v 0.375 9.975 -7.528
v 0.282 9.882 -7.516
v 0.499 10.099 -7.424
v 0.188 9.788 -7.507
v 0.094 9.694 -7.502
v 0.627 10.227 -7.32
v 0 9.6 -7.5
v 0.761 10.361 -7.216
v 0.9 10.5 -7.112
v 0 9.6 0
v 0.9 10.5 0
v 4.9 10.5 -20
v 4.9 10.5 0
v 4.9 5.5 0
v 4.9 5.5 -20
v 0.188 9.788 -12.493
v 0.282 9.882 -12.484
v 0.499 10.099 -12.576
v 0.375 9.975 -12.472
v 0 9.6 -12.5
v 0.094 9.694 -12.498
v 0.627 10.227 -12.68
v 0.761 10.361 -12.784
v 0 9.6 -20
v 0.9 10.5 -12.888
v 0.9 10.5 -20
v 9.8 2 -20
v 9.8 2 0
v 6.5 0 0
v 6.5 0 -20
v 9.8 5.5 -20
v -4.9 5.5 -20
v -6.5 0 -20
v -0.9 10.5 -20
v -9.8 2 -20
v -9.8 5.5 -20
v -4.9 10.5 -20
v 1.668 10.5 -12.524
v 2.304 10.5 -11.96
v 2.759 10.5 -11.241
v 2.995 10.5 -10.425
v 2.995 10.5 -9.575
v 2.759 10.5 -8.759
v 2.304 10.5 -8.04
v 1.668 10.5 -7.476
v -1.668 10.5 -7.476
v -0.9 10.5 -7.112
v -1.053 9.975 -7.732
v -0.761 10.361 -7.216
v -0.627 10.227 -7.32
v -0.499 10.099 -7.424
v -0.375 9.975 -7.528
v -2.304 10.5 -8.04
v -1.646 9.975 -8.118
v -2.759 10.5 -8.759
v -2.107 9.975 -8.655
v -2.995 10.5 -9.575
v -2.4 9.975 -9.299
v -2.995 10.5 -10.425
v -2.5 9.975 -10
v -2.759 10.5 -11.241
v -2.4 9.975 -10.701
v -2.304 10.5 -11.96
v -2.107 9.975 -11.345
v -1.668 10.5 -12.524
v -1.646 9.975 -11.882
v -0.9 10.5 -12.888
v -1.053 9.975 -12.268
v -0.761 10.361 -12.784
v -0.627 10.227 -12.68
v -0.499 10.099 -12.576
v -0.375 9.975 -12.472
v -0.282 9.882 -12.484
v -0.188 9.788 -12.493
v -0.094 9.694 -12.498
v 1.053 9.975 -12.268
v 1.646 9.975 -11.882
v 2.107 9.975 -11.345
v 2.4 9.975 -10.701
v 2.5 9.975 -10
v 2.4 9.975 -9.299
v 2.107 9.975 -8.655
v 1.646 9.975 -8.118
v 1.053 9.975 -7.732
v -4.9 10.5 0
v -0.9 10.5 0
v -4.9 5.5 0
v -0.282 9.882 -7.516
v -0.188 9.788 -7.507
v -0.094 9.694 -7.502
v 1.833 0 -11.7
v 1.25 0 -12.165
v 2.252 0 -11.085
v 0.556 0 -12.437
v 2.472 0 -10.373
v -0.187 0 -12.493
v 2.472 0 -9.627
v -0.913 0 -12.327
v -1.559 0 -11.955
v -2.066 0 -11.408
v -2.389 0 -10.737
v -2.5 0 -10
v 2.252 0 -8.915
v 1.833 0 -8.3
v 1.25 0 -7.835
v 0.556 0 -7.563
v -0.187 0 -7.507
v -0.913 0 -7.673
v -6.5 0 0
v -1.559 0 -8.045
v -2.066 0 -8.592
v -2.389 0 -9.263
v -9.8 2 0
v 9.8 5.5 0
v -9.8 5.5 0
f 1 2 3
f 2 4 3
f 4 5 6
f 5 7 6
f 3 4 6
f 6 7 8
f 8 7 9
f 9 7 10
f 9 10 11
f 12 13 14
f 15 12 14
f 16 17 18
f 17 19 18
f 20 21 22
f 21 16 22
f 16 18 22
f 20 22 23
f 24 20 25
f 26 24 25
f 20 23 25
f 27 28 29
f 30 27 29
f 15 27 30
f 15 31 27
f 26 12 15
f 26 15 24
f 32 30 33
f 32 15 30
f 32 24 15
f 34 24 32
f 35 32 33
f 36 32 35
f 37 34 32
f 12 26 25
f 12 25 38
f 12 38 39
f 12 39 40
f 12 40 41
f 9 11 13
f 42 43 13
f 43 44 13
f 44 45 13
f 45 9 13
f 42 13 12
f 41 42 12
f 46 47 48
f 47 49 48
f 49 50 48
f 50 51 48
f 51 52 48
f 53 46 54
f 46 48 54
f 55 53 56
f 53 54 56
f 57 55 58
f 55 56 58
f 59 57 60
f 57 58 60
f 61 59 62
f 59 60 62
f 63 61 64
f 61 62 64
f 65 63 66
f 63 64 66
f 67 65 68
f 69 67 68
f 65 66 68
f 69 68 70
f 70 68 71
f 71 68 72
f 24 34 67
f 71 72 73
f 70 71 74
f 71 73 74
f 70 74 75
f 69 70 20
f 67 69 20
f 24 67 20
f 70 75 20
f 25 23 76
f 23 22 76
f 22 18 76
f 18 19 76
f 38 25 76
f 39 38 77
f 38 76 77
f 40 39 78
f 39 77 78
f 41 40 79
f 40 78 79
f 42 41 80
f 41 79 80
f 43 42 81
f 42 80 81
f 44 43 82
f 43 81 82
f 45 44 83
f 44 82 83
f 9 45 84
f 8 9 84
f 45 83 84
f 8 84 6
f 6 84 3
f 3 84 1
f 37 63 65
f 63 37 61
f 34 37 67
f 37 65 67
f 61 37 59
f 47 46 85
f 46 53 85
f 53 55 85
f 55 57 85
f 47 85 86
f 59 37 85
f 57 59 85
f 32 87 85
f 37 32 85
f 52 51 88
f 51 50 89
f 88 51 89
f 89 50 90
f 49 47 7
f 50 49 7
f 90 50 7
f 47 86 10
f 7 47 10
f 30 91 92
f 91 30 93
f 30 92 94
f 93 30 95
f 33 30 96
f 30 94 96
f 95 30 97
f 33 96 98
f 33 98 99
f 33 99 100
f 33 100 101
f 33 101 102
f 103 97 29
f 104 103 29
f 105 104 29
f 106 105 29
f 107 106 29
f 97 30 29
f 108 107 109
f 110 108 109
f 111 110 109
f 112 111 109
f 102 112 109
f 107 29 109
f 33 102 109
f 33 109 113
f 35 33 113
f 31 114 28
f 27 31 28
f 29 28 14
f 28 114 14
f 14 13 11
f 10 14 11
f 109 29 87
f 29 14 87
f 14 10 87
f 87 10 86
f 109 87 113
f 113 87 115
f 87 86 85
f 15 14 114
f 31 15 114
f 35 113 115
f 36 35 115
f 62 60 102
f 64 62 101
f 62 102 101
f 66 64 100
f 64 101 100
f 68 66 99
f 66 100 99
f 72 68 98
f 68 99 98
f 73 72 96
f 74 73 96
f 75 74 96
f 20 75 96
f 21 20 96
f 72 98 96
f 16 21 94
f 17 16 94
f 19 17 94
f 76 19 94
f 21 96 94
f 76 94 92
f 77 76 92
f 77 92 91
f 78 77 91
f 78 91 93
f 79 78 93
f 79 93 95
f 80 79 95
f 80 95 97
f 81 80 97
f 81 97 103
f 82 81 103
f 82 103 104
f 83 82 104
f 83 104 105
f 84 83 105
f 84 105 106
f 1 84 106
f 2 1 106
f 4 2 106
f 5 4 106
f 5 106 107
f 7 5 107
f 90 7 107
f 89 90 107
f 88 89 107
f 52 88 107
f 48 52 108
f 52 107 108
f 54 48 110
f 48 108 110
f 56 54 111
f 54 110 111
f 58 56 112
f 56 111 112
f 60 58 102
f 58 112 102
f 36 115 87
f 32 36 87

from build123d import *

# Parameters (mm, degrees)
BOSS_EXTRUDE1_DEPTH             = 20
CUT_EXTRUDE1_DEPTH              = 45
M6X1_0_TAPPED_HOLE1_D           = 5
M6X1_0_TAPPED_HOLE1_DEPTH       = 15
M6X1_0_TAPPED_HOLE1_CSINK_D     = 6.05
M6X1_0_TAPPED_HOLE1_CSINK_ANGLE = 90
M6X1_0_TAPPED_HOLE1_TIP         = 1.502151548


with BuildPart() as part:
    # Sketch1 → Boss-Extrude1 (new body)
    with BuildSketch(Plane.XY):
        Polygon((6.5, 0), (-6.5, 0), (-9.8, 2), (-9.8, 5.5), (-4.9, 5.5), (-4.9, 10.5), (4.9, 10.5), (4.9, 5.5), (9.8, 5.5), (9.8, 2), align=None)
    extrude(amount=-BOSS_EXTRUDE1_DEPTH)

    # Sketch2 → Cut-Extrude1 (cut)
    with BuildSketch(Plane.XY):
        Polygon((-0.9, 10.5), (0, 9.6), (0.9, 10.5), align=None)
    extrude(amount=-CUT_EXTRUDE1_DEPTH, mode=Mode.SUBTRACT)

    # M6x1.0 Tapped Hole1
    with Locations(Plane(origin=(0, 10.5, 0), x_dir=(1, 0, 0), z_dir=(0, 1, 0))):
        with Locations((0, 10)):
            CounterSinkHole(M6X1_0_TAPPED_HOLE1_D / 2, M6X1_0_TAPPED_HOLE1_CSINK_D / 2, depth=M6X1_0_TAPPED_HOLE1_DEPTH, counter_sink_angle=M6X1_0_TAPPED_HOLE1_CSINK_ANGLE)
            with Locations((0, 0, -(M6X1_0_TAPPED_HOLE1_DEPTH + M6X1_0_TAPPED_HOLE1_TIP / 2))):  # 118° drill point
                Cone(0, M6X1_0_TAPPED_HOLE1_D / 2, M6X1_0_TAPPED_HOLE1_TIP, mode=Mode.SUBTRACT)


solid = part.part
